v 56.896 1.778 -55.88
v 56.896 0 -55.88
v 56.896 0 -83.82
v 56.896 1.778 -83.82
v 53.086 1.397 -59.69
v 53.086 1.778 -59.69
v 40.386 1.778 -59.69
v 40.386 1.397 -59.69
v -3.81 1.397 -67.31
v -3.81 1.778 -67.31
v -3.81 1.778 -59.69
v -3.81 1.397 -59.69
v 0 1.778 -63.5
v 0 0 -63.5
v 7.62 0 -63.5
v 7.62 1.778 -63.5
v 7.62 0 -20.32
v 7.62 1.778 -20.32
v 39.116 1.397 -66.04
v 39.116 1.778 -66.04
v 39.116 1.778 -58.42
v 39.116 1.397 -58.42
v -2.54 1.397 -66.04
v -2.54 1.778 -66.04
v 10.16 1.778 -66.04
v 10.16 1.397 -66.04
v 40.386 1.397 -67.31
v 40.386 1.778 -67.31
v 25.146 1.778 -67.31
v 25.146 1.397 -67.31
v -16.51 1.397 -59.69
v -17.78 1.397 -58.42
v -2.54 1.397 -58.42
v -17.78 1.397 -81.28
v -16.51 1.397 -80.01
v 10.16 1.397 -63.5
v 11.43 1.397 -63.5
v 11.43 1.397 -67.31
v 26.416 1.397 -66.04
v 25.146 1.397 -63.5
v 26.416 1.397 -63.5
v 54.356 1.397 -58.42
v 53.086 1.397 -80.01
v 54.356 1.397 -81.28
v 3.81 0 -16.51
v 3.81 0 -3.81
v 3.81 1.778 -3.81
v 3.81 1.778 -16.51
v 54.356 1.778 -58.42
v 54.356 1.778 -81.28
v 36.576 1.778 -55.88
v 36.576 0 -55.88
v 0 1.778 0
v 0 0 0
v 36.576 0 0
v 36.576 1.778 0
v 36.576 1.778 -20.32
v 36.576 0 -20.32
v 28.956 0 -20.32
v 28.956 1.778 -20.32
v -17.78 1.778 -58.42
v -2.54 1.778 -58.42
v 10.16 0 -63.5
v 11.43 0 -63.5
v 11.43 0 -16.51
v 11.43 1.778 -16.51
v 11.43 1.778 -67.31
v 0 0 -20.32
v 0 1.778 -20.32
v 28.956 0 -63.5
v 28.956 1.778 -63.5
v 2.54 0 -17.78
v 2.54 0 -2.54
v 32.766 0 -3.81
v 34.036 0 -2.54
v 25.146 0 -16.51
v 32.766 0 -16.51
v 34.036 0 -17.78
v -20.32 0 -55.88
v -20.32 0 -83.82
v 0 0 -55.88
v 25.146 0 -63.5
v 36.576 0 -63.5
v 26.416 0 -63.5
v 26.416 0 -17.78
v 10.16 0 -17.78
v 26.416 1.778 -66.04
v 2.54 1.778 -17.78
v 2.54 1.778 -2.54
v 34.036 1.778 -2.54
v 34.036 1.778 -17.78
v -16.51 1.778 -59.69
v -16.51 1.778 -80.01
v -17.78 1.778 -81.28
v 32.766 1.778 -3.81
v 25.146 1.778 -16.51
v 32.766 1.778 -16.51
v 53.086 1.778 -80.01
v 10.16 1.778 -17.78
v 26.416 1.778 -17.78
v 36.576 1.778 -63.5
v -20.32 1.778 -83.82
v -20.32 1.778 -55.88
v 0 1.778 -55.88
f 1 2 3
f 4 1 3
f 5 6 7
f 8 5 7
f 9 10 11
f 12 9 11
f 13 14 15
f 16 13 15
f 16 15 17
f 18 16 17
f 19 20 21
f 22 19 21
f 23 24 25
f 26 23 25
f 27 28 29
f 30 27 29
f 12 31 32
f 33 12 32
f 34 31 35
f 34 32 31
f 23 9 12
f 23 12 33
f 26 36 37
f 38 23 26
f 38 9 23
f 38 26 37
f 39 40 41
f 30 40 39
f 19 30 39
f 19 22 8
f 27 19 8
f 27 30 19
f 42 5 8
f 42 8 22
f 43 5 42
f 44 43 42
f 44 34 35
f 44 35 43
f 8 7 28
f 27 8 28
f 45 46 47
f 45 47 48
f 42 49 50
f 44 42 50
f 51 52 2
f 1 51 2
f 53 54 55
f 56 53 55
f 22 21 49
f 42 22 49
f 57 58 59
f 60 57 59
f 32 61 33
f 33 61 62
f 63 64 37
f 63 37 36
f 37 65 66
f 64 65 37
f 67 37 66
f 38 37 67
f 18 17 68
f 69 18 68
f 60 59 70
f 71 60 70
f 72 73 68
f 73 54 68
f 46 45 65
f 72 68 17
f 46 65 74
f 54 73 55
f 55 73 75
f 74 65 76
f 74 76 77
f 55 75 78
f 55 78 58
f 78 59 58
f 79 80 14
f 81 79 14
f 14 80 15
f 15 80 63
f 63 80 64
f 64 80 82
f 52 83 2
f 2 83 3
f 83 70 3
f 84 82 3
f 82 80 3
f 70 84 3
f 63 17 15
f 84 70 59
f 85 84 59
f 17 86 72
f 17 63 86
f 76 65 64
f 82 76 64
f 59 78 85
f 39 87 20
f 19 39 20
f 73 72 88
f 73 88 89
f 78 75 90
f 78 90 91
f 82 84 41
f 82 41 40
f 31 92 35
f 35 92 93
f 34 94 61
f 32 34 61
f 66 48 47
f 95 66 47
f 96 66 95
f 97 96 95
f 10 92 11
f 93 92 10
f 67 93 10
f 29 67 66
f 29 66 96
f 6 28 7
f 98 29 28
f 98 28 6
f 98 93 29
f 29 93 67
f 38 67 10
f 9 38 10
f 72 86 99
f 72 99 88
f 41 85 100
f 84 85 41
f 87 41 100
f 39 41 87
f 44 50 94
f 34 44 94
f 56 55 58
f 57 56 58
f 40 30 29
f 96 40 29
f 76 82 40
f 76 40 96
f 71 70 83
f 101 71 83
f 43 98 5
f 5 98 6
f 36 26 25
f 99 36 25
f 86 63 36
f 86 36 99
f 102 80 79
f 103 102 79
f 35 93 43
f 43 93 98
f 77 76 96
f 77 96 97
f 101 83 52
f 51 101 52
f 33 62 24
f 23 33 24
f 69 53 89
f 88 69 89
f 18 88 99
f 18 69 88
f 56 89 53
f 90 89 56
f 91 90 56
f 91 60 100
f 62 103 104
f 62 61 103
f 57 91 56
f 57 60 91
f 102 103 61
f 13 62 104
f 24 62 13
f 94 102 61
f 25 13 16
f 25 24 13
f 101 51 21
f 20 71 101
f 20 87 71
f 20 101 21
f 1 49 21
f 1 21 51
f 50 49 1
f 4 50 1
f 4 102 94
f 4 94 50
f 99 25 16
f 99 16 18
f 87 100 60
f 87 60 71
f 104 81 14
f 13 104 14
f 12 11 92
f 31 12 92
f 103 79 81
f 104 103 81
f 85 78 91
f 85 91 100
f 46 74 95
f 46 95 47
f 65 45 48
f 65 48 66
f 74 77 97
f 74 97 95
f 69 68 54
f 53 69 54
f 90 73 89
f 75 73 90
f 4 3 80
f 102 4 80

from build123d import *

# Parameters (mm, degrees)
BOSS_EXTRUDE1_DEPTH = 1.778
CUT_EXTRUDE1_DEPTH  = 0.381


with BuildPart() as part:
    # Sketch1 → Boss-Extrude1 (new body)
    with BuildSketch(Plane(origin=(0, 0, 0), x_dir=(1, 0, 0), z_dir=(0, 1, 0))):
        Polygon((-20.32, 83.82), (-20.32, 55.88), (0, 55.88), (0, 63.5), (7.62, 63.5), (7.62, 20.32), (0, 20.32), (0, 0), (36.576, 0), (36.576, 20.32), (28.956, 20.32), (28.956, 63.5), (36.576, 63.5), (36.576, 55.88), (56.896, 55.88), (56.896, 83.82), align=None)
        Polygon((10.16, 17.78), (2.54, 17.78), (2.54, 2.54), (34.036, 2.54), (34.036, 17.78), (26.416, 17.78), (26.416, 63.5), (25.146, 63.5), (25.146, 16.51), (32.766, 16.51), (32.766, 3.81), (3.81, 3.81), (3.81, 16.51), (11.43, 16.51), (11.43, 63.5), (10.16, 63.5), align=None, mode=Mode.SUBTRACT)
    extrude(amount=BOSS_EXTRUDE1_DEPTH)

    # Sketch2 → Cut-Extrude1 (cut)
    with BuildSketch(Plane(origin=(0, 1.778, 0), x_dir=(1, 0, 0), z_dir=(0, 1, 0))):
        Polygon((-16.51, 80.01), (53.086, 80.01), (53.086, 59.69), (40.386, 59.69), (40.386, 67.31), (25.146, 67.31), (25.146, 63.5), (26.416, 63.5), (26.416, 66.04), (39.116, 66.04), (39.116, 58.42), (54.356, 58.42), (54.356, 81.28), (-17.78, 81.28), (-17.78, 58.42), (-2.54, 58.42), (-2.54, 66.04), (10.16, 66.04), (10.16, 63.5), (11.43, 63.5), (11.43, 67.31), (-3.81, 67.31), (-3.81, 59.69), (-16.51, 59.69), align=None)
    extrude(amount=-CUT_EXTRUDE1_DEPTH, mode=Mode.SUBTRACT)


solid = part.part
